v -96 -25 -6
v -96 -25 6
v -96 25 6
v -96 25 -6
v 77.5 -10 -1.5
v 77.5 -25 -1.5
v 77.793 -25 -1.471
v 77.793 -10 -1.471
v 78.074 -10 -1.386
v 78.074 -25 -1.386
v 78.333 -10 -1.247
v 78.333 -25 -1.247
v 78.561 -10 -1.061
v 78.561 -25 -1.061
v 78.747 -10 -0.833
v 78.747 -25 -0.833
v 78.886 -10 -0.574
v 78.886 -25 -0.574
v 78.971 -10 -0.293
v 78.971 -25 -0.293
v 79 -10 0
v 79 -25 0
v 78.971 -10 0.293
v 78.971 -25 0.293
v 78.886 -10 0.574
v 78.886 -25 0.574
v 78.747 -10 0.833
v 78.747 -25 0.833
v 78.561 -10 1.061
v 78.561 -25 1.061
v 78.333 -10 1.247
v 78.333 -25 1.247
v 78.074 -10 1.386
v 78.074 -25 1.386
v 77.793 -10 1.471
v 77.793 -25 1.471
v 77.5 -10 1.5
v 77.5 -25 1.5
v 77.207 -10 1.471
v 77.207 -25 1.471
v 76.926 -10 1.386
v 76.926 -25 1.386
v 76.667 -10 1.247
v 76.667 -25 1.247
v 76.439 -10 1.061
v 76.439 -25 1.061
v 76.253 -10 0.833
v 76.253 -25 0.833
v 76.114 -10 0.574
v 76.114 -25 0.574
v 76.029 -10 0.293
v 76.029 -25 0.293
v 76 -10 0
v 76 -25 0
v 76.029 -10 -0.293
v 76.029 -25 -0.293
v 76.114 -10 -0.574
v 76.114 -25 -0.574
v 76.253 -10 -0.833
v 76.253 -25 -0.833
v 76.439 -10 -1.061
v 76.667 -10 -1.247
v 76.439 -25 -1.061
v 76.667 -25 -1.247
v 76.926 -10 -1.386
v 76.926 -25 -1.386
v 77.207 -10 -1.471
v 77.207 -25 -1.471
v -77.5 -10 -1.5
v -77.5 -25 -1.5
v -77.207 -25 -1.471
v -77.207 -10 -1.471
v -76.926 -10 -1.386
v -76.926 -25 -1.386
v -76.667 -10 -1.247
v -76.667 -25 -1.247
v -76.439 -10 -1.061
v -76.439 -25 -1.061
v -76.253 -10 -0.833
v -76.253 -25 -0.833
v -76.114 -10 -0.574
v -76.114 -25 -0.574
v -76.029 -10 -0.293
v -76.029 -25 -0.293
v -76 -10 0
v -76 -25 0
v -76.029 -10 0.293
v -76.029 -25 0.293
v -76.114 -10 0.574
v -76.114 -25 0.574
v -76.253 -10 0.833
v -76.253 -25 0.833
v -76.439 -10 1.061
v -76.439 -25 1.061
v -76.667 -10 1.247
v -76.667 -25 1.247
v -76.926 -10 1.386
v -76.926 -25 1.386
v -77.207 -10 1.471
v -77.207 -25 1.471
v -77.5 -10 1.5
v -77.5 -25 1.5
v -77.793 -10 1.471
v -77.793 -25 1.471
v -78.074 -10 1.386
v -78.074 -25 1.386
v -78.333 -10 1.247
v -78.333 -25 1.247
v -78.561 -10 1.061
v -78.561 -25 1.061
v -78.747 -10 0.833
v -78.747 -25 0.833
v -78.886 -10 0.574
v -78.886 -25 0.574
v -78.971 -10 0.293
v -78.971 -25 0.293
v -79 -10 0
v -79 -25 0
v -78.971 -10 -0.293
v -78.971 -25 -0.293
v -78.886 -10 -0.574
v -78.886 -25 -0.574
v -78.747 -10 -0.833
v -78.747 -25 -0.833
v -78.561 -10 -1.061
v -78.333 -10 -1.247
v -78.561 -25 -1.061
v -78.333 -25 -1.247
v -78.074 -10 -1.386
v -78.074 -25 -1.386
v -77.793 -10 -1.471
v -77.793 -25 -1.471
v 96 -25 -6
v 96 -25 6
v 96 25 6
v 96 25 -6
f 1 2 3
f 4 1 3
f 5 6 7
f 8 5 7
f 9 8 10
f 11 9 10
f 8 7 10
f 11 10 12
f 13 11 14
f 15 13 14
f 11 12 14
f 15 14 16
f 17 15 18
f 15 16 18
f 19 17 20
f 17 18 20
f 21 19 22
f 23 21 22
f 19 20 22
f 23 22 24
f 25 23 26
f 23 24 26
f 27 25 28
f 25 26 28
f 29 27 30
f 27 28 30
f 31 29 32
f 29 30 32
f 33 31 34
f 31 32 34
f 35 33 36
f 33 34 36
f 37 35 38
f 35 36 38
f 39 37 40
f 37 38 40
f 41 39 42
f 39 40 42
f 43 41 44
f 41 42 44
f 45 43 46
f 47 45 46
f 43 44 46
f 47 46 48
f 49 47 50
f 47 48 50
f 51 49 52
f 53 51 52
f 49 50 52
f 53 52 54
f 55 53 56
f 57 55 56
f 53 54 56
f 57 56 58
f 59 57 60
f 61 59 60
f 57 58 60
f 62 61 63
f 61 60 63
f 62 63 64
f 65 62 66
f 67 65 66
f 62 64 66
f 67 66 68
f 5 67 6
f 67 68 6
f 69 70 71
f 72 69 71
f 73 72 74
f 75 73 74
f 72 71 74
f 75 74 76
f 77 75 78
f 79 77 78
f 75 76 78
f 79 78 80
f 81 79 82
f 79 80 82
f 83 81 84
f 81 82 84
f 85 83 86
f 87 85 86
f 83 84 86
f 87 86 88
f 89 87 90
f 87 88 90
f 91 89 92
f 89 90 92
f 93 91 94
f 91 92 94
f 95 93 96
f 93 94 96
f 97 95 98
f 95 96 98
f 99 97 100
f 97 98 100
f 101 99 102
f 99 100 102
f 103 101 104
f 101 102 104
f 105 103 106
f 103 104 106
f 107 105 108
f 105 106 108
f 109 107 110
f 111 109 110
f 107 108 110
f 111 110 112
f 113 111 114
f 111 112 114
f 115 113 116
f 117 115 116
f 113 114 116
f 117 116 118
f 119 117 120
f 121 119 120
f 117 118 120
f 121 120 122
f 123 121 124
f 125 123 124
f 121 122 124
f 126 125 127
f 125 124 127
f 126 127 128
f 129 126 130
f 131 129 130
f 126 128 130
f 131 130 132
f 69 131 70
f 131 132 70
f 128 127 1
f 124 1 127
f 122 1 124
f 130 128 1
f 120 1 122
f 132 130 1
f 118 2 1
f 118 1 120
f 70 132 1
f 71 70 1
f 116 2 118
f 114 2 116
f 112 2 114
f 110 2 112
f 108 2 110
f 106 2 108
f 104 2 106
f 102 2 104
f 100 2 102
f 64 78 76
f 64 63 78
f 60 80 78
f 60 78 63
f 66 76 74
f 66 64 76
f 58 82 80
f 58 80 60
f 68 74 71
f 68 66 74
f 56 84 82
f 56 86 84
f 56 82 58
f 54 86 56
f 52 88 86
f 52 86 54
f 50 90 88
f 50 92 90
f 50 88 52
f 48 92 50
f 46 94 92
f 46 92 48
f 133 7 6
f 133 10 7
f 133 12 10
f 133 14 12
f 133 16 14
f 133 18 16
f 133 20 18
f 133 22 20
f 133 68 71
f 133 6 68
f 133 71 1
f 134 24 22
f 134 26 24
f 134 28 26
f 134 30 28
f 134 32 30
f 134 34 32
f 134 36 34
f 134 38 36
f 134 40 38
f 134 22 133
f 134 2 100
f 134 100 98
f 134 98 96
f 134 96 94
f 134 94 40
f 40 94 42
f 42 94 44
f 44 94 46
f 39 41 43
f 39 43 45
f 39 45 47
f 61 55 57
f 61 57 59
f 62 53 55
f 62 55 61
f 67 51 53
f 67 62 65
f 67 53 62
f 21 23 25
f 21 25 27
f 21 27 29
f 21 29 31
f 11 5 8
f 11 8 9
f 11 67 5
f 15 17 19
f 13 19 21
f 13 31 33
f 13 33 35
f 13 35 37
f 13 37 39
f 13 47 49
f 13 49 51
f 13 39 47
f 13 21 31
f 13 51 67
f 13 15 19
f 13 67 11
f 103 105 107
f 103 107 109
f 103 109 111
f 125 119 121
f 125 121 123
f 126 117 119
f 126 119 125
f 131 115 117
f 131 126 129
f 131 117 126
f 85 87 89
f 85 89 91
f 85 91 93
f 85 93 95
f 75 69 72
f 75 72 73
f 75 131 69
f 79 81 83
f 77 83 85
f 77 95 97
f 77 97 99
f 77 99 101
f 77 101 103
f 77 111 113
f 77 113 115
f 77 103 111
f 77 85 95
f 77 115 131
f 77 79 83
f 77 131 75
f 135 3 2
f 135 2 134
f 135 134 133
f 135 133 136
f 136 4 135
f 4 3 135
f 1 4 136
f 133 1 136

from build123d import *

# Parameters (mm, degrees)
ESBO_O1_W                = 192
ESBO_O1_H                = 50
RESSALTO_EXTRUS_O1_DEPTH = 6
ESBO_O2_R                = 1.5
CORTE_EXTRUS_O1_DEPTH    = 15


with BuildPart() as part:
    # Esboço1 → Ressalto-extrusão1 (new, symmetric)
    with BuildSketch(Plane.XY):
        Rectangle(ESBO_O1_W, ESBO_O1_H)
    extrude(amount=RESSALTO_EXTRUS_O1_DEPTH, both=True)

    # Esboço2 → Corte-extrusão1 (cut, symmetric)
    with BuildSketch(Plane(origin=(0, -25, 0), x_dir=(-1, 0, 0), z_dir=(0, -1, 0))):
        with Locations(Location((77.5, 0, 0), (0, 0, 90))):
            Circle(ESBO_O2_R)
        with Locations(Location((-77.5, 0, 0), (0, 0, 90))):
            Circle(ESBO_O2_R)
    extrude(amount=CORTE_EXTRUS_O1_DEPTH, both=True, mode=Mode.SUBTRACT)


solid = part.part
